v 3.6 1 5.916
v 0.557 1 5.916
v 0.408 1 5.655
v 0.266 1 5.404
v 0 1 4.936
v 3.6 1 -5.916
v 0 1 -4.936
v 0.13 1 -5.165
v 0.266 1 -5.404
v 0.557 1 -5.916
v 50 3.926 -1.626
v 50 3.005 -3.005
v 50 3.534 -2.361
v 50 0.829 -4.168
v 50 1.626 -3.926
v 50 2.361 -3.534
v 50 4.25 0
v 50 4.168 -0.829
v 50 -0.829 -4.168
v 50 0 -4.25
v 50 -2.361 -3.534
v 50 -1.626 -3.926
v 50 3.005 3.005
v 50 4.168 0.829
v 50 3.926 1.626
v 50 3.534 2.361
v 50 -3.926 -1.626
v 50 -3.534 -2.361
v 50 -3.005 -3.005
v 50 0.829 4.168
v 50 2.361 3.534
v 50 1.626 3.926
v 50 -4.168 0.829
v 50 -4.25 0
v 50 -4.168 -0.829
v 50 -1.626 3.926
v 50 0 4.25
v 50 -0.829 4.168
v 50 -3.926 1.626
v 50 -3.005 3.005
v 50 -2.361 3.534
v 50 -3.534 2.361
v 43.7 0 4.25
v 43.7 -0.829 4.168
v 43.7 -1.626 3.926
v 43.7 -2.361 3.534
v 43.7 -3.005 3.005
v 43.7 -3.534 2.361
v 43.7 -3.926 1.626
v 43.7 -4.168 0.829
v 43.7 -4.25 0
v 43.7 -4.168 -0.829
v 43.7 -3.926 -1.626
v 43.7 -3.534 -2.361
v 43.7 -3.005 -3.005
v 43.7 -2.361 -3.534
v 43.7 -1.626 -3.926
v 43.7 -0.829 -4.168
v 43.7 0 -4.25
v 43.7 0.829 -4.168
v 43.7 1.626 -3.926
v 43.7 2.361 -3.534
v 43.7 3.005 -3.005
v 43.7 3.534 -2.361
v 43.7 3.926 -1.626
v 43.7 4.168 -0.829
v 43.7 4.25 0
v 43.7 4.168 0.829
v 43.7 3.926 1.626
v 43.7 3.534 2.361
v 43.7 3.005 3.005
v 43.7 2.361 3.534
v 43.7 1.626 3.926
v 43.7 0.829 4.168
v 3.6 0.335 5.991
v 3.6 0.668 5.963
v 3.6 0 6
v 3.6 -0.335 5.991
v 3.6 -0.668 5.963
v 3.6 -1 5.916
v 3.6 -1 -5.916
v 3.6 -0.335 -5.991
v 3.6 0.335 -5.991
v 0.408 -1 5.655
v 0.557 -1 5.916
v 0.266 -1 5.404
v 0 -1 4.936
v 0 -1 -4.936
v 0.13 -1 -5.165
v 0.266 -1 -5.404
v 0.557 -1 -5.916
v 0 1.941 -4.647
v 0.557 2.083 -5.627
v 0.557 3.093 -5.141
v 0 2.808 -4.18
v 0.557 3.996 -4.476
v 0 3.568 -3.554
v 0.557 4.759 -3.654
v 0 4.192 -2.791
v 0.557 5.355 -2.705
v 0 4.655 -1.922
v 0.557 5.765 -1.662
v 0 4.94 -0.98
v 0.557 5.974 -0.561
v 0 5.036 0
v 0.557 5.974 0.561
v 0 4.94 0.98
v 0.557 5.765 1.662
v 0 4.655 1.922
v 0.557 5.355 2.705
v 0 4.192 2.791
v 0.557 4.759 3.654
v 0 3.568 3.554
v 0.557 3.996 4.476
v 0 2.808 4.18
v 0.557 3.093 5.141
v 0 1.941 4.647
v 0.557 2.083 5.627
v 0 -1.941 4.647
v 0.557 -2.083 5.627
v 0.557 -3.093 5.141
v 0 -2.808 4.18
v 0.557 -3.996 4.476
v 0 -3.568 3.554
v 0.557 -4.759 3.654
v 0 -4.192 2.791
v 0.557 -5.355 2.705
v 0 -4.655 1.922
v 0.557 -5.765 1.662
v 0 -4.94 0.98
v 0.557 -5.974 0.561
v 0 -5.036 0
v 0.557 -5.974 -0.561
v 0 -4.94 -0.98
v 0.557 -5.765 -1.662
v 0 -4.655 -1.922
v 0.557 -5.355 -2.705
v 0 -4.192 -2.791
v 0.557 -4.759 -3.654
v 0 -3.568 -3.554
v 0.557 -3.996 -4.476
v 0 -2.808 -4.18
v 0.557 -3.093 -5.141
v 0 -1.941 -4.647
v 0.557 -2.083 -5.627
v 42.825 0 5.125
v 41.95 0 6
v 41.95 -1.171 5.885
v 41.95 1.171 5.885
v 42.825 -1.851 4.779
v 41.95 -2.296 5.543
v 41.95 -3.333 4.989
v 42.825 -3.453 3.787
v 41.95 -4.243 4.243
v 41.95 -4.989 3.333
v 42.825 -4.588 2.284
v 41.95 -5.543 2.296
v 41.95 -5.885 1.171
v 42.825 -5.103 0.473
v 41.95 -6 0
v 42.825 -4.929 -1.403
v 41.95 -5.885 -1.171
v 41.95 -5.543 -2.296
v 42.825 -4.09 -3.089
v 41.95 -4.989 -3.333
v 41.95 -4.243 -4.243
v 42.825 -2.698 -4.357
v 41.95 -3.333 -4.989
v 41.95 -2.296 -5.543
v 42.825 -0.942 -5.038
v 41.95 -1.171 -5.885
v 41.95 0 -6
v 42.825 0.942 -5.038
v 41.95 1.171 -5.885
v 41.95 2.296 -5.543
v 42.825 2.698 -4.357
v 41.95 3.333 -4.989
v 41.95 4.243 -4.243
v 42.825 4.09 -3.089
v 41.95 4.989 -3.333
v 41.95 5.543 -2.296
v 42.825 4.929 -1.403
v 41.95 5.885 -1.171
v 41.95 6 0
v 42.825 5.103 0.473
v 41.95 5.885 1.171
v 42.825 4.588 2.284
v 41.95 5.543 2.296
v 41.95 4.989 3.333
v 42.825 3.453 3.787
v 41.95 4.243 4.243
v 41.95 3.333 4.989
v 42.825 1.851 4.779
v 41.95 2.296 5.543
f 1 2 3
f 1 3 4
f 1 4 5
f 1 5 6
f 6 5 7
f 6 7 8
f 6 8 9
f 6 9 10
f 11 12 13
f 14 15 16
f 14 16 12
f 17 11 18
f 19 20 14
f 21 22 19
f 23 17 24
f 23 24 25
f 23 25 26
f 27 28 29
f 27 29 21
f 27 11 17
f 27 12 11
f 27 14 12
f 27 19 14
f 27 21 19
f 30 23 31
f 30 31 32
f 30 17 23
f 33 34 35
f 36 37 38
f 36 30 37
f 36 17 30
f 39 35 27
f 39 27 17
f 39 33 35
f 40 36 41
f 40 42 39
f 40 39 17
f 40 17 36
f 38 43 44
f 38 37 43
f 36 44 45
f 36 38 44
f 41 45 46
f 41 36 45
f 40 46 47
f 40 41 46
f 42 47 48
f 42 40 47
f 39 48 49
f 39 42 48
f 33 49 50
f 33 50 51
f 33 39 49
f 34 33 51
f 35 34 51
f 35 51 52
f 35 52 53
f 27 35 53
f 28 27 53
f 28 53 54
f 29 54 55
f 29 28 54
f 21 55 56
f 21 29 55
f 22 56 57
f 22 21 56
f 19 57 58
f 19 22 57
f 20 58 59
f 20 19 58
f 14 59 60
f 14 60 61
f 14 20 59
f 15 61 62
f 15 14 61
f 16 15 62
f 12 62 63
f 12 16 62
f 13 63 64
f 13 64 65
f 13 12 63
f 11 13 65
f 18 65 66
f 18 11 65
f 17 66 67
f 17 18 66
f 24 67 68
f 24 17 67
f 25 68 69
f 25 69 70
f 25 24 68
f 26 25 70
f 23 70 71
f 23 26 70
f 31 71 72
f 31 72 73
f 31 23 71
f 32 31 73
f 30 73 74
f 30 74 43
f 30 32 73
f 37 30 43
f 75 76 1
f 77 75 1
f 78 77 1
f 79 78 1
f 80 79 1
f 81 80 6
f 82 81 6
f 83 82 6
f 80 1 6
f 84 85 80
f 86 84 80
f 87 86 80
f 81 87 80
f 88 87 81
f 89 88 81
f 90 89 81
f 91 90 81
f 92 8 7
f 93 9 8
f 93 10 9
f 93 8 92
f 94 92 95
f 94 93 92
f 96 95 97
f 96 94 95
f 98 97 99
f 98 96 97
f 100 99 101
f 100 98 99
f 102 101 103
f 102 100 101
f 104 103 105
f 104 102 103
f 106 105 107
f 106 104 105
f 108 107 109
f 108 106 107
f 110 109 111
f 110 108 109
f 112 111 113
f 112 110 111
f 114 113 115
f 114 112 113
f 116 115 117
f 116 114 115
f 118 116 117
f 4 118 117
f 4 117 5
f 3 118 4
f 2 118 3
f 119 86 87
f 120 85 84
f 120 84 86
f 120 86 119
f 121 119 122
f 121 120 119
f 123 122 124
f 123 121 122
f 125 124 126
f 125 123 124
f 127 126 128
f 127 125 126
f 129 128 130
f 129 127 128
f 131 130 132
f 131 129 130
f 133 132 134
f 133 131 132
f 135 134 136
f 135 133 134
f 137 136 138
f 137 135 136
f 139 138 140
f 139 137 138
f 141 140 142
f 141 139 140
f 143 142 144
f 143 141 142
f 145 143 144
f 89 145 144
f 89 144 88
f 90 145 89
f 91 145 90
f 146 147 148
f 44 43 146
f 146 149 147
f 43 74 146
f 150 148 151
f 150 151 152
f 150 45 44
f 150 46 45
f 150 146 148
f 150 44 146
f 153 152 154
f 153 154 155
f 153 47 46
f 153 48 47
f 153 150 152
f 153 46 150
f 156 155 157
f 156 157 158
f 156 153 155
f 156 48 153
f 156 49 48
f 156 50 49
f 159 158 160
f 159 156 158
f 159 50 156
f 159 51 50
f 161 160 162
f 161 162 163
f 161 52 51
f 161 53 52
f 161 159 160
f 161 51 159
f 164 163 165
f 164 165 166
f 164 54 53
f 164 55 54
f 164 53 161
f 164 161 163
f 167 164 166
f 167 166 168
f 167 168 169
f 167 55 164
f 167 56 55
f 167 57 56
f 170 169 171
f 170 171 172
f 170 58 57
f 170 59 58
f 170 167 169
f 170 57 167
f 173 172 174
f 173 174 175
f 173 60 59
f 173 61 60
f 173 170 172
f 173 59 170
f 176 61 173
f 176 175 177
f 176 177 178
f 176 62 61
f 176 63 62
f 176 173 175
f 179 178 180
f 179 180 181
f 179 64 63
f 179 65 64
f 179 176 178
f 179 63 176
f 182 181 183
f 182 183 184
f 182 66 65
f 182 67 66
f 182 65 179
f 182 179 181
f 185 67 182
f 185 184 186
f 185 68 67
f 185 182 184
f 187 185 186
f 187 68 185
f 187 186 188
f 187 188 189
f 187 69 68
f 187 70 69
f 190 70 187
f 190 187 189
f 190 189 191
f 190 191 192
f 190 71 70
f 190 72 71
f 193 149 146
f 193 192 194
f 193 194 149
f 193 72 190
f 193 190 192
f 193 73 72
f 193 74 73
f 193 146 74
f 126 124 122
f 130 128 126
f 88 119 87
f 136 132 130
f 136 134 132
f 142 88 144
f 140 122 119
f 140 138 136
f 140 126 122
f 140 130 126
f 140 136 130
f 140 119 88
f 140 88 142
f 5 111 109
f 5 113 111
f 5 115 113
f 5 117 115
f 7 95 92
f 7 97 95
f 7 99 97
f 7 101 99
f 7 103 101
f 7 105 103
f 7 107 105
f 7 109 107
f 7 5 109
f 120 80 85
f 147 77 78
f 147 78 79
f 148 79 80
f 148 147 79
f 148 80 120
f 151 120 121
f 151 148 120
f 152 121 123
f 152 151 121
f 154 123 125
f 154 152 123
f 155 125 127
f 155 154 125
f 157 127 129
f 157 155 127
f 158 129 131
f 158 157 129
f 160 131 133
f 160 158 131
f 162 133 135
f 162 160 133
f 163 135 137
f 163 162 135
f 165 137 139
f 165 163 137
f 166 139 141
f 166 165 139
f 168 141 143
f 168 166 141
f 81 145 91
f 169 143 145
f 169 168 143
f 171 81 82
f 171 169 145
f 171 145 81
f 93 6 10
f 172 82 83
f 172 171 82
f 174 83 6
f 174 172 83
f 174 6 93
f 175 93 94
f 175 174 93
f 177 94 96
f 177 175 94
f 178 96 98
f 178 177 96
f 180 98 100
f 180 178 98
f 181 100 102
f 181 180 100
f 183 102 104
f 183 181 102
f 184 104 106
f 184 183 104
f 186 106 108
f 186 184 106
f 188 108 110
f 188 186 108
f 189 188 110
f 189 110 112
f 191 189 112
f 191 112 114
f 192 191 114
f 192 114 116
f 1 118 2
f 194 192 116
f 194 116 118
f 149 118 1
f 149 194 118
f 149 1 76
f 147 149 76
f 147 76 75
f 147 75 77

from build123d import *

# Parameters (mm, degrees)
SKETCH2_W  = 12
SKETCH2_H  = 2
SLOT_DEPTH = 3.6


with BuildPart() as part:
    # BodySke → BaseBody (revolve)
    with BuildSketch(Plane.XY, mode=Mode.PRIVATE) as basebody_sk:
        Polygon((43.7, 4.25), (50, 4.25), (50, 0), (0, 0), (0, 5.036), (0.556565659, 6), (41.95, 6), align=None)
    revolve(basebody_sk.sketch.rotate(Axis((-12.7, 0, 0), (1, 0, 0)), 90), axis=Axis((-12.7, 0, 0), (1, 0, 0)))

    # Sketch2 → Slot (cut)
    with BuildSketch(Plane(origin=(0, 0, 0), x_dir=(0, 0, -1), z_dir=(1, 0, 0))):
        Rectangle(SKETCH2_W, SKETCH2_H)
    extrude(amount=SLOT_DEPTH, mode=Mode.SUBTRACT)


solid = part.part
